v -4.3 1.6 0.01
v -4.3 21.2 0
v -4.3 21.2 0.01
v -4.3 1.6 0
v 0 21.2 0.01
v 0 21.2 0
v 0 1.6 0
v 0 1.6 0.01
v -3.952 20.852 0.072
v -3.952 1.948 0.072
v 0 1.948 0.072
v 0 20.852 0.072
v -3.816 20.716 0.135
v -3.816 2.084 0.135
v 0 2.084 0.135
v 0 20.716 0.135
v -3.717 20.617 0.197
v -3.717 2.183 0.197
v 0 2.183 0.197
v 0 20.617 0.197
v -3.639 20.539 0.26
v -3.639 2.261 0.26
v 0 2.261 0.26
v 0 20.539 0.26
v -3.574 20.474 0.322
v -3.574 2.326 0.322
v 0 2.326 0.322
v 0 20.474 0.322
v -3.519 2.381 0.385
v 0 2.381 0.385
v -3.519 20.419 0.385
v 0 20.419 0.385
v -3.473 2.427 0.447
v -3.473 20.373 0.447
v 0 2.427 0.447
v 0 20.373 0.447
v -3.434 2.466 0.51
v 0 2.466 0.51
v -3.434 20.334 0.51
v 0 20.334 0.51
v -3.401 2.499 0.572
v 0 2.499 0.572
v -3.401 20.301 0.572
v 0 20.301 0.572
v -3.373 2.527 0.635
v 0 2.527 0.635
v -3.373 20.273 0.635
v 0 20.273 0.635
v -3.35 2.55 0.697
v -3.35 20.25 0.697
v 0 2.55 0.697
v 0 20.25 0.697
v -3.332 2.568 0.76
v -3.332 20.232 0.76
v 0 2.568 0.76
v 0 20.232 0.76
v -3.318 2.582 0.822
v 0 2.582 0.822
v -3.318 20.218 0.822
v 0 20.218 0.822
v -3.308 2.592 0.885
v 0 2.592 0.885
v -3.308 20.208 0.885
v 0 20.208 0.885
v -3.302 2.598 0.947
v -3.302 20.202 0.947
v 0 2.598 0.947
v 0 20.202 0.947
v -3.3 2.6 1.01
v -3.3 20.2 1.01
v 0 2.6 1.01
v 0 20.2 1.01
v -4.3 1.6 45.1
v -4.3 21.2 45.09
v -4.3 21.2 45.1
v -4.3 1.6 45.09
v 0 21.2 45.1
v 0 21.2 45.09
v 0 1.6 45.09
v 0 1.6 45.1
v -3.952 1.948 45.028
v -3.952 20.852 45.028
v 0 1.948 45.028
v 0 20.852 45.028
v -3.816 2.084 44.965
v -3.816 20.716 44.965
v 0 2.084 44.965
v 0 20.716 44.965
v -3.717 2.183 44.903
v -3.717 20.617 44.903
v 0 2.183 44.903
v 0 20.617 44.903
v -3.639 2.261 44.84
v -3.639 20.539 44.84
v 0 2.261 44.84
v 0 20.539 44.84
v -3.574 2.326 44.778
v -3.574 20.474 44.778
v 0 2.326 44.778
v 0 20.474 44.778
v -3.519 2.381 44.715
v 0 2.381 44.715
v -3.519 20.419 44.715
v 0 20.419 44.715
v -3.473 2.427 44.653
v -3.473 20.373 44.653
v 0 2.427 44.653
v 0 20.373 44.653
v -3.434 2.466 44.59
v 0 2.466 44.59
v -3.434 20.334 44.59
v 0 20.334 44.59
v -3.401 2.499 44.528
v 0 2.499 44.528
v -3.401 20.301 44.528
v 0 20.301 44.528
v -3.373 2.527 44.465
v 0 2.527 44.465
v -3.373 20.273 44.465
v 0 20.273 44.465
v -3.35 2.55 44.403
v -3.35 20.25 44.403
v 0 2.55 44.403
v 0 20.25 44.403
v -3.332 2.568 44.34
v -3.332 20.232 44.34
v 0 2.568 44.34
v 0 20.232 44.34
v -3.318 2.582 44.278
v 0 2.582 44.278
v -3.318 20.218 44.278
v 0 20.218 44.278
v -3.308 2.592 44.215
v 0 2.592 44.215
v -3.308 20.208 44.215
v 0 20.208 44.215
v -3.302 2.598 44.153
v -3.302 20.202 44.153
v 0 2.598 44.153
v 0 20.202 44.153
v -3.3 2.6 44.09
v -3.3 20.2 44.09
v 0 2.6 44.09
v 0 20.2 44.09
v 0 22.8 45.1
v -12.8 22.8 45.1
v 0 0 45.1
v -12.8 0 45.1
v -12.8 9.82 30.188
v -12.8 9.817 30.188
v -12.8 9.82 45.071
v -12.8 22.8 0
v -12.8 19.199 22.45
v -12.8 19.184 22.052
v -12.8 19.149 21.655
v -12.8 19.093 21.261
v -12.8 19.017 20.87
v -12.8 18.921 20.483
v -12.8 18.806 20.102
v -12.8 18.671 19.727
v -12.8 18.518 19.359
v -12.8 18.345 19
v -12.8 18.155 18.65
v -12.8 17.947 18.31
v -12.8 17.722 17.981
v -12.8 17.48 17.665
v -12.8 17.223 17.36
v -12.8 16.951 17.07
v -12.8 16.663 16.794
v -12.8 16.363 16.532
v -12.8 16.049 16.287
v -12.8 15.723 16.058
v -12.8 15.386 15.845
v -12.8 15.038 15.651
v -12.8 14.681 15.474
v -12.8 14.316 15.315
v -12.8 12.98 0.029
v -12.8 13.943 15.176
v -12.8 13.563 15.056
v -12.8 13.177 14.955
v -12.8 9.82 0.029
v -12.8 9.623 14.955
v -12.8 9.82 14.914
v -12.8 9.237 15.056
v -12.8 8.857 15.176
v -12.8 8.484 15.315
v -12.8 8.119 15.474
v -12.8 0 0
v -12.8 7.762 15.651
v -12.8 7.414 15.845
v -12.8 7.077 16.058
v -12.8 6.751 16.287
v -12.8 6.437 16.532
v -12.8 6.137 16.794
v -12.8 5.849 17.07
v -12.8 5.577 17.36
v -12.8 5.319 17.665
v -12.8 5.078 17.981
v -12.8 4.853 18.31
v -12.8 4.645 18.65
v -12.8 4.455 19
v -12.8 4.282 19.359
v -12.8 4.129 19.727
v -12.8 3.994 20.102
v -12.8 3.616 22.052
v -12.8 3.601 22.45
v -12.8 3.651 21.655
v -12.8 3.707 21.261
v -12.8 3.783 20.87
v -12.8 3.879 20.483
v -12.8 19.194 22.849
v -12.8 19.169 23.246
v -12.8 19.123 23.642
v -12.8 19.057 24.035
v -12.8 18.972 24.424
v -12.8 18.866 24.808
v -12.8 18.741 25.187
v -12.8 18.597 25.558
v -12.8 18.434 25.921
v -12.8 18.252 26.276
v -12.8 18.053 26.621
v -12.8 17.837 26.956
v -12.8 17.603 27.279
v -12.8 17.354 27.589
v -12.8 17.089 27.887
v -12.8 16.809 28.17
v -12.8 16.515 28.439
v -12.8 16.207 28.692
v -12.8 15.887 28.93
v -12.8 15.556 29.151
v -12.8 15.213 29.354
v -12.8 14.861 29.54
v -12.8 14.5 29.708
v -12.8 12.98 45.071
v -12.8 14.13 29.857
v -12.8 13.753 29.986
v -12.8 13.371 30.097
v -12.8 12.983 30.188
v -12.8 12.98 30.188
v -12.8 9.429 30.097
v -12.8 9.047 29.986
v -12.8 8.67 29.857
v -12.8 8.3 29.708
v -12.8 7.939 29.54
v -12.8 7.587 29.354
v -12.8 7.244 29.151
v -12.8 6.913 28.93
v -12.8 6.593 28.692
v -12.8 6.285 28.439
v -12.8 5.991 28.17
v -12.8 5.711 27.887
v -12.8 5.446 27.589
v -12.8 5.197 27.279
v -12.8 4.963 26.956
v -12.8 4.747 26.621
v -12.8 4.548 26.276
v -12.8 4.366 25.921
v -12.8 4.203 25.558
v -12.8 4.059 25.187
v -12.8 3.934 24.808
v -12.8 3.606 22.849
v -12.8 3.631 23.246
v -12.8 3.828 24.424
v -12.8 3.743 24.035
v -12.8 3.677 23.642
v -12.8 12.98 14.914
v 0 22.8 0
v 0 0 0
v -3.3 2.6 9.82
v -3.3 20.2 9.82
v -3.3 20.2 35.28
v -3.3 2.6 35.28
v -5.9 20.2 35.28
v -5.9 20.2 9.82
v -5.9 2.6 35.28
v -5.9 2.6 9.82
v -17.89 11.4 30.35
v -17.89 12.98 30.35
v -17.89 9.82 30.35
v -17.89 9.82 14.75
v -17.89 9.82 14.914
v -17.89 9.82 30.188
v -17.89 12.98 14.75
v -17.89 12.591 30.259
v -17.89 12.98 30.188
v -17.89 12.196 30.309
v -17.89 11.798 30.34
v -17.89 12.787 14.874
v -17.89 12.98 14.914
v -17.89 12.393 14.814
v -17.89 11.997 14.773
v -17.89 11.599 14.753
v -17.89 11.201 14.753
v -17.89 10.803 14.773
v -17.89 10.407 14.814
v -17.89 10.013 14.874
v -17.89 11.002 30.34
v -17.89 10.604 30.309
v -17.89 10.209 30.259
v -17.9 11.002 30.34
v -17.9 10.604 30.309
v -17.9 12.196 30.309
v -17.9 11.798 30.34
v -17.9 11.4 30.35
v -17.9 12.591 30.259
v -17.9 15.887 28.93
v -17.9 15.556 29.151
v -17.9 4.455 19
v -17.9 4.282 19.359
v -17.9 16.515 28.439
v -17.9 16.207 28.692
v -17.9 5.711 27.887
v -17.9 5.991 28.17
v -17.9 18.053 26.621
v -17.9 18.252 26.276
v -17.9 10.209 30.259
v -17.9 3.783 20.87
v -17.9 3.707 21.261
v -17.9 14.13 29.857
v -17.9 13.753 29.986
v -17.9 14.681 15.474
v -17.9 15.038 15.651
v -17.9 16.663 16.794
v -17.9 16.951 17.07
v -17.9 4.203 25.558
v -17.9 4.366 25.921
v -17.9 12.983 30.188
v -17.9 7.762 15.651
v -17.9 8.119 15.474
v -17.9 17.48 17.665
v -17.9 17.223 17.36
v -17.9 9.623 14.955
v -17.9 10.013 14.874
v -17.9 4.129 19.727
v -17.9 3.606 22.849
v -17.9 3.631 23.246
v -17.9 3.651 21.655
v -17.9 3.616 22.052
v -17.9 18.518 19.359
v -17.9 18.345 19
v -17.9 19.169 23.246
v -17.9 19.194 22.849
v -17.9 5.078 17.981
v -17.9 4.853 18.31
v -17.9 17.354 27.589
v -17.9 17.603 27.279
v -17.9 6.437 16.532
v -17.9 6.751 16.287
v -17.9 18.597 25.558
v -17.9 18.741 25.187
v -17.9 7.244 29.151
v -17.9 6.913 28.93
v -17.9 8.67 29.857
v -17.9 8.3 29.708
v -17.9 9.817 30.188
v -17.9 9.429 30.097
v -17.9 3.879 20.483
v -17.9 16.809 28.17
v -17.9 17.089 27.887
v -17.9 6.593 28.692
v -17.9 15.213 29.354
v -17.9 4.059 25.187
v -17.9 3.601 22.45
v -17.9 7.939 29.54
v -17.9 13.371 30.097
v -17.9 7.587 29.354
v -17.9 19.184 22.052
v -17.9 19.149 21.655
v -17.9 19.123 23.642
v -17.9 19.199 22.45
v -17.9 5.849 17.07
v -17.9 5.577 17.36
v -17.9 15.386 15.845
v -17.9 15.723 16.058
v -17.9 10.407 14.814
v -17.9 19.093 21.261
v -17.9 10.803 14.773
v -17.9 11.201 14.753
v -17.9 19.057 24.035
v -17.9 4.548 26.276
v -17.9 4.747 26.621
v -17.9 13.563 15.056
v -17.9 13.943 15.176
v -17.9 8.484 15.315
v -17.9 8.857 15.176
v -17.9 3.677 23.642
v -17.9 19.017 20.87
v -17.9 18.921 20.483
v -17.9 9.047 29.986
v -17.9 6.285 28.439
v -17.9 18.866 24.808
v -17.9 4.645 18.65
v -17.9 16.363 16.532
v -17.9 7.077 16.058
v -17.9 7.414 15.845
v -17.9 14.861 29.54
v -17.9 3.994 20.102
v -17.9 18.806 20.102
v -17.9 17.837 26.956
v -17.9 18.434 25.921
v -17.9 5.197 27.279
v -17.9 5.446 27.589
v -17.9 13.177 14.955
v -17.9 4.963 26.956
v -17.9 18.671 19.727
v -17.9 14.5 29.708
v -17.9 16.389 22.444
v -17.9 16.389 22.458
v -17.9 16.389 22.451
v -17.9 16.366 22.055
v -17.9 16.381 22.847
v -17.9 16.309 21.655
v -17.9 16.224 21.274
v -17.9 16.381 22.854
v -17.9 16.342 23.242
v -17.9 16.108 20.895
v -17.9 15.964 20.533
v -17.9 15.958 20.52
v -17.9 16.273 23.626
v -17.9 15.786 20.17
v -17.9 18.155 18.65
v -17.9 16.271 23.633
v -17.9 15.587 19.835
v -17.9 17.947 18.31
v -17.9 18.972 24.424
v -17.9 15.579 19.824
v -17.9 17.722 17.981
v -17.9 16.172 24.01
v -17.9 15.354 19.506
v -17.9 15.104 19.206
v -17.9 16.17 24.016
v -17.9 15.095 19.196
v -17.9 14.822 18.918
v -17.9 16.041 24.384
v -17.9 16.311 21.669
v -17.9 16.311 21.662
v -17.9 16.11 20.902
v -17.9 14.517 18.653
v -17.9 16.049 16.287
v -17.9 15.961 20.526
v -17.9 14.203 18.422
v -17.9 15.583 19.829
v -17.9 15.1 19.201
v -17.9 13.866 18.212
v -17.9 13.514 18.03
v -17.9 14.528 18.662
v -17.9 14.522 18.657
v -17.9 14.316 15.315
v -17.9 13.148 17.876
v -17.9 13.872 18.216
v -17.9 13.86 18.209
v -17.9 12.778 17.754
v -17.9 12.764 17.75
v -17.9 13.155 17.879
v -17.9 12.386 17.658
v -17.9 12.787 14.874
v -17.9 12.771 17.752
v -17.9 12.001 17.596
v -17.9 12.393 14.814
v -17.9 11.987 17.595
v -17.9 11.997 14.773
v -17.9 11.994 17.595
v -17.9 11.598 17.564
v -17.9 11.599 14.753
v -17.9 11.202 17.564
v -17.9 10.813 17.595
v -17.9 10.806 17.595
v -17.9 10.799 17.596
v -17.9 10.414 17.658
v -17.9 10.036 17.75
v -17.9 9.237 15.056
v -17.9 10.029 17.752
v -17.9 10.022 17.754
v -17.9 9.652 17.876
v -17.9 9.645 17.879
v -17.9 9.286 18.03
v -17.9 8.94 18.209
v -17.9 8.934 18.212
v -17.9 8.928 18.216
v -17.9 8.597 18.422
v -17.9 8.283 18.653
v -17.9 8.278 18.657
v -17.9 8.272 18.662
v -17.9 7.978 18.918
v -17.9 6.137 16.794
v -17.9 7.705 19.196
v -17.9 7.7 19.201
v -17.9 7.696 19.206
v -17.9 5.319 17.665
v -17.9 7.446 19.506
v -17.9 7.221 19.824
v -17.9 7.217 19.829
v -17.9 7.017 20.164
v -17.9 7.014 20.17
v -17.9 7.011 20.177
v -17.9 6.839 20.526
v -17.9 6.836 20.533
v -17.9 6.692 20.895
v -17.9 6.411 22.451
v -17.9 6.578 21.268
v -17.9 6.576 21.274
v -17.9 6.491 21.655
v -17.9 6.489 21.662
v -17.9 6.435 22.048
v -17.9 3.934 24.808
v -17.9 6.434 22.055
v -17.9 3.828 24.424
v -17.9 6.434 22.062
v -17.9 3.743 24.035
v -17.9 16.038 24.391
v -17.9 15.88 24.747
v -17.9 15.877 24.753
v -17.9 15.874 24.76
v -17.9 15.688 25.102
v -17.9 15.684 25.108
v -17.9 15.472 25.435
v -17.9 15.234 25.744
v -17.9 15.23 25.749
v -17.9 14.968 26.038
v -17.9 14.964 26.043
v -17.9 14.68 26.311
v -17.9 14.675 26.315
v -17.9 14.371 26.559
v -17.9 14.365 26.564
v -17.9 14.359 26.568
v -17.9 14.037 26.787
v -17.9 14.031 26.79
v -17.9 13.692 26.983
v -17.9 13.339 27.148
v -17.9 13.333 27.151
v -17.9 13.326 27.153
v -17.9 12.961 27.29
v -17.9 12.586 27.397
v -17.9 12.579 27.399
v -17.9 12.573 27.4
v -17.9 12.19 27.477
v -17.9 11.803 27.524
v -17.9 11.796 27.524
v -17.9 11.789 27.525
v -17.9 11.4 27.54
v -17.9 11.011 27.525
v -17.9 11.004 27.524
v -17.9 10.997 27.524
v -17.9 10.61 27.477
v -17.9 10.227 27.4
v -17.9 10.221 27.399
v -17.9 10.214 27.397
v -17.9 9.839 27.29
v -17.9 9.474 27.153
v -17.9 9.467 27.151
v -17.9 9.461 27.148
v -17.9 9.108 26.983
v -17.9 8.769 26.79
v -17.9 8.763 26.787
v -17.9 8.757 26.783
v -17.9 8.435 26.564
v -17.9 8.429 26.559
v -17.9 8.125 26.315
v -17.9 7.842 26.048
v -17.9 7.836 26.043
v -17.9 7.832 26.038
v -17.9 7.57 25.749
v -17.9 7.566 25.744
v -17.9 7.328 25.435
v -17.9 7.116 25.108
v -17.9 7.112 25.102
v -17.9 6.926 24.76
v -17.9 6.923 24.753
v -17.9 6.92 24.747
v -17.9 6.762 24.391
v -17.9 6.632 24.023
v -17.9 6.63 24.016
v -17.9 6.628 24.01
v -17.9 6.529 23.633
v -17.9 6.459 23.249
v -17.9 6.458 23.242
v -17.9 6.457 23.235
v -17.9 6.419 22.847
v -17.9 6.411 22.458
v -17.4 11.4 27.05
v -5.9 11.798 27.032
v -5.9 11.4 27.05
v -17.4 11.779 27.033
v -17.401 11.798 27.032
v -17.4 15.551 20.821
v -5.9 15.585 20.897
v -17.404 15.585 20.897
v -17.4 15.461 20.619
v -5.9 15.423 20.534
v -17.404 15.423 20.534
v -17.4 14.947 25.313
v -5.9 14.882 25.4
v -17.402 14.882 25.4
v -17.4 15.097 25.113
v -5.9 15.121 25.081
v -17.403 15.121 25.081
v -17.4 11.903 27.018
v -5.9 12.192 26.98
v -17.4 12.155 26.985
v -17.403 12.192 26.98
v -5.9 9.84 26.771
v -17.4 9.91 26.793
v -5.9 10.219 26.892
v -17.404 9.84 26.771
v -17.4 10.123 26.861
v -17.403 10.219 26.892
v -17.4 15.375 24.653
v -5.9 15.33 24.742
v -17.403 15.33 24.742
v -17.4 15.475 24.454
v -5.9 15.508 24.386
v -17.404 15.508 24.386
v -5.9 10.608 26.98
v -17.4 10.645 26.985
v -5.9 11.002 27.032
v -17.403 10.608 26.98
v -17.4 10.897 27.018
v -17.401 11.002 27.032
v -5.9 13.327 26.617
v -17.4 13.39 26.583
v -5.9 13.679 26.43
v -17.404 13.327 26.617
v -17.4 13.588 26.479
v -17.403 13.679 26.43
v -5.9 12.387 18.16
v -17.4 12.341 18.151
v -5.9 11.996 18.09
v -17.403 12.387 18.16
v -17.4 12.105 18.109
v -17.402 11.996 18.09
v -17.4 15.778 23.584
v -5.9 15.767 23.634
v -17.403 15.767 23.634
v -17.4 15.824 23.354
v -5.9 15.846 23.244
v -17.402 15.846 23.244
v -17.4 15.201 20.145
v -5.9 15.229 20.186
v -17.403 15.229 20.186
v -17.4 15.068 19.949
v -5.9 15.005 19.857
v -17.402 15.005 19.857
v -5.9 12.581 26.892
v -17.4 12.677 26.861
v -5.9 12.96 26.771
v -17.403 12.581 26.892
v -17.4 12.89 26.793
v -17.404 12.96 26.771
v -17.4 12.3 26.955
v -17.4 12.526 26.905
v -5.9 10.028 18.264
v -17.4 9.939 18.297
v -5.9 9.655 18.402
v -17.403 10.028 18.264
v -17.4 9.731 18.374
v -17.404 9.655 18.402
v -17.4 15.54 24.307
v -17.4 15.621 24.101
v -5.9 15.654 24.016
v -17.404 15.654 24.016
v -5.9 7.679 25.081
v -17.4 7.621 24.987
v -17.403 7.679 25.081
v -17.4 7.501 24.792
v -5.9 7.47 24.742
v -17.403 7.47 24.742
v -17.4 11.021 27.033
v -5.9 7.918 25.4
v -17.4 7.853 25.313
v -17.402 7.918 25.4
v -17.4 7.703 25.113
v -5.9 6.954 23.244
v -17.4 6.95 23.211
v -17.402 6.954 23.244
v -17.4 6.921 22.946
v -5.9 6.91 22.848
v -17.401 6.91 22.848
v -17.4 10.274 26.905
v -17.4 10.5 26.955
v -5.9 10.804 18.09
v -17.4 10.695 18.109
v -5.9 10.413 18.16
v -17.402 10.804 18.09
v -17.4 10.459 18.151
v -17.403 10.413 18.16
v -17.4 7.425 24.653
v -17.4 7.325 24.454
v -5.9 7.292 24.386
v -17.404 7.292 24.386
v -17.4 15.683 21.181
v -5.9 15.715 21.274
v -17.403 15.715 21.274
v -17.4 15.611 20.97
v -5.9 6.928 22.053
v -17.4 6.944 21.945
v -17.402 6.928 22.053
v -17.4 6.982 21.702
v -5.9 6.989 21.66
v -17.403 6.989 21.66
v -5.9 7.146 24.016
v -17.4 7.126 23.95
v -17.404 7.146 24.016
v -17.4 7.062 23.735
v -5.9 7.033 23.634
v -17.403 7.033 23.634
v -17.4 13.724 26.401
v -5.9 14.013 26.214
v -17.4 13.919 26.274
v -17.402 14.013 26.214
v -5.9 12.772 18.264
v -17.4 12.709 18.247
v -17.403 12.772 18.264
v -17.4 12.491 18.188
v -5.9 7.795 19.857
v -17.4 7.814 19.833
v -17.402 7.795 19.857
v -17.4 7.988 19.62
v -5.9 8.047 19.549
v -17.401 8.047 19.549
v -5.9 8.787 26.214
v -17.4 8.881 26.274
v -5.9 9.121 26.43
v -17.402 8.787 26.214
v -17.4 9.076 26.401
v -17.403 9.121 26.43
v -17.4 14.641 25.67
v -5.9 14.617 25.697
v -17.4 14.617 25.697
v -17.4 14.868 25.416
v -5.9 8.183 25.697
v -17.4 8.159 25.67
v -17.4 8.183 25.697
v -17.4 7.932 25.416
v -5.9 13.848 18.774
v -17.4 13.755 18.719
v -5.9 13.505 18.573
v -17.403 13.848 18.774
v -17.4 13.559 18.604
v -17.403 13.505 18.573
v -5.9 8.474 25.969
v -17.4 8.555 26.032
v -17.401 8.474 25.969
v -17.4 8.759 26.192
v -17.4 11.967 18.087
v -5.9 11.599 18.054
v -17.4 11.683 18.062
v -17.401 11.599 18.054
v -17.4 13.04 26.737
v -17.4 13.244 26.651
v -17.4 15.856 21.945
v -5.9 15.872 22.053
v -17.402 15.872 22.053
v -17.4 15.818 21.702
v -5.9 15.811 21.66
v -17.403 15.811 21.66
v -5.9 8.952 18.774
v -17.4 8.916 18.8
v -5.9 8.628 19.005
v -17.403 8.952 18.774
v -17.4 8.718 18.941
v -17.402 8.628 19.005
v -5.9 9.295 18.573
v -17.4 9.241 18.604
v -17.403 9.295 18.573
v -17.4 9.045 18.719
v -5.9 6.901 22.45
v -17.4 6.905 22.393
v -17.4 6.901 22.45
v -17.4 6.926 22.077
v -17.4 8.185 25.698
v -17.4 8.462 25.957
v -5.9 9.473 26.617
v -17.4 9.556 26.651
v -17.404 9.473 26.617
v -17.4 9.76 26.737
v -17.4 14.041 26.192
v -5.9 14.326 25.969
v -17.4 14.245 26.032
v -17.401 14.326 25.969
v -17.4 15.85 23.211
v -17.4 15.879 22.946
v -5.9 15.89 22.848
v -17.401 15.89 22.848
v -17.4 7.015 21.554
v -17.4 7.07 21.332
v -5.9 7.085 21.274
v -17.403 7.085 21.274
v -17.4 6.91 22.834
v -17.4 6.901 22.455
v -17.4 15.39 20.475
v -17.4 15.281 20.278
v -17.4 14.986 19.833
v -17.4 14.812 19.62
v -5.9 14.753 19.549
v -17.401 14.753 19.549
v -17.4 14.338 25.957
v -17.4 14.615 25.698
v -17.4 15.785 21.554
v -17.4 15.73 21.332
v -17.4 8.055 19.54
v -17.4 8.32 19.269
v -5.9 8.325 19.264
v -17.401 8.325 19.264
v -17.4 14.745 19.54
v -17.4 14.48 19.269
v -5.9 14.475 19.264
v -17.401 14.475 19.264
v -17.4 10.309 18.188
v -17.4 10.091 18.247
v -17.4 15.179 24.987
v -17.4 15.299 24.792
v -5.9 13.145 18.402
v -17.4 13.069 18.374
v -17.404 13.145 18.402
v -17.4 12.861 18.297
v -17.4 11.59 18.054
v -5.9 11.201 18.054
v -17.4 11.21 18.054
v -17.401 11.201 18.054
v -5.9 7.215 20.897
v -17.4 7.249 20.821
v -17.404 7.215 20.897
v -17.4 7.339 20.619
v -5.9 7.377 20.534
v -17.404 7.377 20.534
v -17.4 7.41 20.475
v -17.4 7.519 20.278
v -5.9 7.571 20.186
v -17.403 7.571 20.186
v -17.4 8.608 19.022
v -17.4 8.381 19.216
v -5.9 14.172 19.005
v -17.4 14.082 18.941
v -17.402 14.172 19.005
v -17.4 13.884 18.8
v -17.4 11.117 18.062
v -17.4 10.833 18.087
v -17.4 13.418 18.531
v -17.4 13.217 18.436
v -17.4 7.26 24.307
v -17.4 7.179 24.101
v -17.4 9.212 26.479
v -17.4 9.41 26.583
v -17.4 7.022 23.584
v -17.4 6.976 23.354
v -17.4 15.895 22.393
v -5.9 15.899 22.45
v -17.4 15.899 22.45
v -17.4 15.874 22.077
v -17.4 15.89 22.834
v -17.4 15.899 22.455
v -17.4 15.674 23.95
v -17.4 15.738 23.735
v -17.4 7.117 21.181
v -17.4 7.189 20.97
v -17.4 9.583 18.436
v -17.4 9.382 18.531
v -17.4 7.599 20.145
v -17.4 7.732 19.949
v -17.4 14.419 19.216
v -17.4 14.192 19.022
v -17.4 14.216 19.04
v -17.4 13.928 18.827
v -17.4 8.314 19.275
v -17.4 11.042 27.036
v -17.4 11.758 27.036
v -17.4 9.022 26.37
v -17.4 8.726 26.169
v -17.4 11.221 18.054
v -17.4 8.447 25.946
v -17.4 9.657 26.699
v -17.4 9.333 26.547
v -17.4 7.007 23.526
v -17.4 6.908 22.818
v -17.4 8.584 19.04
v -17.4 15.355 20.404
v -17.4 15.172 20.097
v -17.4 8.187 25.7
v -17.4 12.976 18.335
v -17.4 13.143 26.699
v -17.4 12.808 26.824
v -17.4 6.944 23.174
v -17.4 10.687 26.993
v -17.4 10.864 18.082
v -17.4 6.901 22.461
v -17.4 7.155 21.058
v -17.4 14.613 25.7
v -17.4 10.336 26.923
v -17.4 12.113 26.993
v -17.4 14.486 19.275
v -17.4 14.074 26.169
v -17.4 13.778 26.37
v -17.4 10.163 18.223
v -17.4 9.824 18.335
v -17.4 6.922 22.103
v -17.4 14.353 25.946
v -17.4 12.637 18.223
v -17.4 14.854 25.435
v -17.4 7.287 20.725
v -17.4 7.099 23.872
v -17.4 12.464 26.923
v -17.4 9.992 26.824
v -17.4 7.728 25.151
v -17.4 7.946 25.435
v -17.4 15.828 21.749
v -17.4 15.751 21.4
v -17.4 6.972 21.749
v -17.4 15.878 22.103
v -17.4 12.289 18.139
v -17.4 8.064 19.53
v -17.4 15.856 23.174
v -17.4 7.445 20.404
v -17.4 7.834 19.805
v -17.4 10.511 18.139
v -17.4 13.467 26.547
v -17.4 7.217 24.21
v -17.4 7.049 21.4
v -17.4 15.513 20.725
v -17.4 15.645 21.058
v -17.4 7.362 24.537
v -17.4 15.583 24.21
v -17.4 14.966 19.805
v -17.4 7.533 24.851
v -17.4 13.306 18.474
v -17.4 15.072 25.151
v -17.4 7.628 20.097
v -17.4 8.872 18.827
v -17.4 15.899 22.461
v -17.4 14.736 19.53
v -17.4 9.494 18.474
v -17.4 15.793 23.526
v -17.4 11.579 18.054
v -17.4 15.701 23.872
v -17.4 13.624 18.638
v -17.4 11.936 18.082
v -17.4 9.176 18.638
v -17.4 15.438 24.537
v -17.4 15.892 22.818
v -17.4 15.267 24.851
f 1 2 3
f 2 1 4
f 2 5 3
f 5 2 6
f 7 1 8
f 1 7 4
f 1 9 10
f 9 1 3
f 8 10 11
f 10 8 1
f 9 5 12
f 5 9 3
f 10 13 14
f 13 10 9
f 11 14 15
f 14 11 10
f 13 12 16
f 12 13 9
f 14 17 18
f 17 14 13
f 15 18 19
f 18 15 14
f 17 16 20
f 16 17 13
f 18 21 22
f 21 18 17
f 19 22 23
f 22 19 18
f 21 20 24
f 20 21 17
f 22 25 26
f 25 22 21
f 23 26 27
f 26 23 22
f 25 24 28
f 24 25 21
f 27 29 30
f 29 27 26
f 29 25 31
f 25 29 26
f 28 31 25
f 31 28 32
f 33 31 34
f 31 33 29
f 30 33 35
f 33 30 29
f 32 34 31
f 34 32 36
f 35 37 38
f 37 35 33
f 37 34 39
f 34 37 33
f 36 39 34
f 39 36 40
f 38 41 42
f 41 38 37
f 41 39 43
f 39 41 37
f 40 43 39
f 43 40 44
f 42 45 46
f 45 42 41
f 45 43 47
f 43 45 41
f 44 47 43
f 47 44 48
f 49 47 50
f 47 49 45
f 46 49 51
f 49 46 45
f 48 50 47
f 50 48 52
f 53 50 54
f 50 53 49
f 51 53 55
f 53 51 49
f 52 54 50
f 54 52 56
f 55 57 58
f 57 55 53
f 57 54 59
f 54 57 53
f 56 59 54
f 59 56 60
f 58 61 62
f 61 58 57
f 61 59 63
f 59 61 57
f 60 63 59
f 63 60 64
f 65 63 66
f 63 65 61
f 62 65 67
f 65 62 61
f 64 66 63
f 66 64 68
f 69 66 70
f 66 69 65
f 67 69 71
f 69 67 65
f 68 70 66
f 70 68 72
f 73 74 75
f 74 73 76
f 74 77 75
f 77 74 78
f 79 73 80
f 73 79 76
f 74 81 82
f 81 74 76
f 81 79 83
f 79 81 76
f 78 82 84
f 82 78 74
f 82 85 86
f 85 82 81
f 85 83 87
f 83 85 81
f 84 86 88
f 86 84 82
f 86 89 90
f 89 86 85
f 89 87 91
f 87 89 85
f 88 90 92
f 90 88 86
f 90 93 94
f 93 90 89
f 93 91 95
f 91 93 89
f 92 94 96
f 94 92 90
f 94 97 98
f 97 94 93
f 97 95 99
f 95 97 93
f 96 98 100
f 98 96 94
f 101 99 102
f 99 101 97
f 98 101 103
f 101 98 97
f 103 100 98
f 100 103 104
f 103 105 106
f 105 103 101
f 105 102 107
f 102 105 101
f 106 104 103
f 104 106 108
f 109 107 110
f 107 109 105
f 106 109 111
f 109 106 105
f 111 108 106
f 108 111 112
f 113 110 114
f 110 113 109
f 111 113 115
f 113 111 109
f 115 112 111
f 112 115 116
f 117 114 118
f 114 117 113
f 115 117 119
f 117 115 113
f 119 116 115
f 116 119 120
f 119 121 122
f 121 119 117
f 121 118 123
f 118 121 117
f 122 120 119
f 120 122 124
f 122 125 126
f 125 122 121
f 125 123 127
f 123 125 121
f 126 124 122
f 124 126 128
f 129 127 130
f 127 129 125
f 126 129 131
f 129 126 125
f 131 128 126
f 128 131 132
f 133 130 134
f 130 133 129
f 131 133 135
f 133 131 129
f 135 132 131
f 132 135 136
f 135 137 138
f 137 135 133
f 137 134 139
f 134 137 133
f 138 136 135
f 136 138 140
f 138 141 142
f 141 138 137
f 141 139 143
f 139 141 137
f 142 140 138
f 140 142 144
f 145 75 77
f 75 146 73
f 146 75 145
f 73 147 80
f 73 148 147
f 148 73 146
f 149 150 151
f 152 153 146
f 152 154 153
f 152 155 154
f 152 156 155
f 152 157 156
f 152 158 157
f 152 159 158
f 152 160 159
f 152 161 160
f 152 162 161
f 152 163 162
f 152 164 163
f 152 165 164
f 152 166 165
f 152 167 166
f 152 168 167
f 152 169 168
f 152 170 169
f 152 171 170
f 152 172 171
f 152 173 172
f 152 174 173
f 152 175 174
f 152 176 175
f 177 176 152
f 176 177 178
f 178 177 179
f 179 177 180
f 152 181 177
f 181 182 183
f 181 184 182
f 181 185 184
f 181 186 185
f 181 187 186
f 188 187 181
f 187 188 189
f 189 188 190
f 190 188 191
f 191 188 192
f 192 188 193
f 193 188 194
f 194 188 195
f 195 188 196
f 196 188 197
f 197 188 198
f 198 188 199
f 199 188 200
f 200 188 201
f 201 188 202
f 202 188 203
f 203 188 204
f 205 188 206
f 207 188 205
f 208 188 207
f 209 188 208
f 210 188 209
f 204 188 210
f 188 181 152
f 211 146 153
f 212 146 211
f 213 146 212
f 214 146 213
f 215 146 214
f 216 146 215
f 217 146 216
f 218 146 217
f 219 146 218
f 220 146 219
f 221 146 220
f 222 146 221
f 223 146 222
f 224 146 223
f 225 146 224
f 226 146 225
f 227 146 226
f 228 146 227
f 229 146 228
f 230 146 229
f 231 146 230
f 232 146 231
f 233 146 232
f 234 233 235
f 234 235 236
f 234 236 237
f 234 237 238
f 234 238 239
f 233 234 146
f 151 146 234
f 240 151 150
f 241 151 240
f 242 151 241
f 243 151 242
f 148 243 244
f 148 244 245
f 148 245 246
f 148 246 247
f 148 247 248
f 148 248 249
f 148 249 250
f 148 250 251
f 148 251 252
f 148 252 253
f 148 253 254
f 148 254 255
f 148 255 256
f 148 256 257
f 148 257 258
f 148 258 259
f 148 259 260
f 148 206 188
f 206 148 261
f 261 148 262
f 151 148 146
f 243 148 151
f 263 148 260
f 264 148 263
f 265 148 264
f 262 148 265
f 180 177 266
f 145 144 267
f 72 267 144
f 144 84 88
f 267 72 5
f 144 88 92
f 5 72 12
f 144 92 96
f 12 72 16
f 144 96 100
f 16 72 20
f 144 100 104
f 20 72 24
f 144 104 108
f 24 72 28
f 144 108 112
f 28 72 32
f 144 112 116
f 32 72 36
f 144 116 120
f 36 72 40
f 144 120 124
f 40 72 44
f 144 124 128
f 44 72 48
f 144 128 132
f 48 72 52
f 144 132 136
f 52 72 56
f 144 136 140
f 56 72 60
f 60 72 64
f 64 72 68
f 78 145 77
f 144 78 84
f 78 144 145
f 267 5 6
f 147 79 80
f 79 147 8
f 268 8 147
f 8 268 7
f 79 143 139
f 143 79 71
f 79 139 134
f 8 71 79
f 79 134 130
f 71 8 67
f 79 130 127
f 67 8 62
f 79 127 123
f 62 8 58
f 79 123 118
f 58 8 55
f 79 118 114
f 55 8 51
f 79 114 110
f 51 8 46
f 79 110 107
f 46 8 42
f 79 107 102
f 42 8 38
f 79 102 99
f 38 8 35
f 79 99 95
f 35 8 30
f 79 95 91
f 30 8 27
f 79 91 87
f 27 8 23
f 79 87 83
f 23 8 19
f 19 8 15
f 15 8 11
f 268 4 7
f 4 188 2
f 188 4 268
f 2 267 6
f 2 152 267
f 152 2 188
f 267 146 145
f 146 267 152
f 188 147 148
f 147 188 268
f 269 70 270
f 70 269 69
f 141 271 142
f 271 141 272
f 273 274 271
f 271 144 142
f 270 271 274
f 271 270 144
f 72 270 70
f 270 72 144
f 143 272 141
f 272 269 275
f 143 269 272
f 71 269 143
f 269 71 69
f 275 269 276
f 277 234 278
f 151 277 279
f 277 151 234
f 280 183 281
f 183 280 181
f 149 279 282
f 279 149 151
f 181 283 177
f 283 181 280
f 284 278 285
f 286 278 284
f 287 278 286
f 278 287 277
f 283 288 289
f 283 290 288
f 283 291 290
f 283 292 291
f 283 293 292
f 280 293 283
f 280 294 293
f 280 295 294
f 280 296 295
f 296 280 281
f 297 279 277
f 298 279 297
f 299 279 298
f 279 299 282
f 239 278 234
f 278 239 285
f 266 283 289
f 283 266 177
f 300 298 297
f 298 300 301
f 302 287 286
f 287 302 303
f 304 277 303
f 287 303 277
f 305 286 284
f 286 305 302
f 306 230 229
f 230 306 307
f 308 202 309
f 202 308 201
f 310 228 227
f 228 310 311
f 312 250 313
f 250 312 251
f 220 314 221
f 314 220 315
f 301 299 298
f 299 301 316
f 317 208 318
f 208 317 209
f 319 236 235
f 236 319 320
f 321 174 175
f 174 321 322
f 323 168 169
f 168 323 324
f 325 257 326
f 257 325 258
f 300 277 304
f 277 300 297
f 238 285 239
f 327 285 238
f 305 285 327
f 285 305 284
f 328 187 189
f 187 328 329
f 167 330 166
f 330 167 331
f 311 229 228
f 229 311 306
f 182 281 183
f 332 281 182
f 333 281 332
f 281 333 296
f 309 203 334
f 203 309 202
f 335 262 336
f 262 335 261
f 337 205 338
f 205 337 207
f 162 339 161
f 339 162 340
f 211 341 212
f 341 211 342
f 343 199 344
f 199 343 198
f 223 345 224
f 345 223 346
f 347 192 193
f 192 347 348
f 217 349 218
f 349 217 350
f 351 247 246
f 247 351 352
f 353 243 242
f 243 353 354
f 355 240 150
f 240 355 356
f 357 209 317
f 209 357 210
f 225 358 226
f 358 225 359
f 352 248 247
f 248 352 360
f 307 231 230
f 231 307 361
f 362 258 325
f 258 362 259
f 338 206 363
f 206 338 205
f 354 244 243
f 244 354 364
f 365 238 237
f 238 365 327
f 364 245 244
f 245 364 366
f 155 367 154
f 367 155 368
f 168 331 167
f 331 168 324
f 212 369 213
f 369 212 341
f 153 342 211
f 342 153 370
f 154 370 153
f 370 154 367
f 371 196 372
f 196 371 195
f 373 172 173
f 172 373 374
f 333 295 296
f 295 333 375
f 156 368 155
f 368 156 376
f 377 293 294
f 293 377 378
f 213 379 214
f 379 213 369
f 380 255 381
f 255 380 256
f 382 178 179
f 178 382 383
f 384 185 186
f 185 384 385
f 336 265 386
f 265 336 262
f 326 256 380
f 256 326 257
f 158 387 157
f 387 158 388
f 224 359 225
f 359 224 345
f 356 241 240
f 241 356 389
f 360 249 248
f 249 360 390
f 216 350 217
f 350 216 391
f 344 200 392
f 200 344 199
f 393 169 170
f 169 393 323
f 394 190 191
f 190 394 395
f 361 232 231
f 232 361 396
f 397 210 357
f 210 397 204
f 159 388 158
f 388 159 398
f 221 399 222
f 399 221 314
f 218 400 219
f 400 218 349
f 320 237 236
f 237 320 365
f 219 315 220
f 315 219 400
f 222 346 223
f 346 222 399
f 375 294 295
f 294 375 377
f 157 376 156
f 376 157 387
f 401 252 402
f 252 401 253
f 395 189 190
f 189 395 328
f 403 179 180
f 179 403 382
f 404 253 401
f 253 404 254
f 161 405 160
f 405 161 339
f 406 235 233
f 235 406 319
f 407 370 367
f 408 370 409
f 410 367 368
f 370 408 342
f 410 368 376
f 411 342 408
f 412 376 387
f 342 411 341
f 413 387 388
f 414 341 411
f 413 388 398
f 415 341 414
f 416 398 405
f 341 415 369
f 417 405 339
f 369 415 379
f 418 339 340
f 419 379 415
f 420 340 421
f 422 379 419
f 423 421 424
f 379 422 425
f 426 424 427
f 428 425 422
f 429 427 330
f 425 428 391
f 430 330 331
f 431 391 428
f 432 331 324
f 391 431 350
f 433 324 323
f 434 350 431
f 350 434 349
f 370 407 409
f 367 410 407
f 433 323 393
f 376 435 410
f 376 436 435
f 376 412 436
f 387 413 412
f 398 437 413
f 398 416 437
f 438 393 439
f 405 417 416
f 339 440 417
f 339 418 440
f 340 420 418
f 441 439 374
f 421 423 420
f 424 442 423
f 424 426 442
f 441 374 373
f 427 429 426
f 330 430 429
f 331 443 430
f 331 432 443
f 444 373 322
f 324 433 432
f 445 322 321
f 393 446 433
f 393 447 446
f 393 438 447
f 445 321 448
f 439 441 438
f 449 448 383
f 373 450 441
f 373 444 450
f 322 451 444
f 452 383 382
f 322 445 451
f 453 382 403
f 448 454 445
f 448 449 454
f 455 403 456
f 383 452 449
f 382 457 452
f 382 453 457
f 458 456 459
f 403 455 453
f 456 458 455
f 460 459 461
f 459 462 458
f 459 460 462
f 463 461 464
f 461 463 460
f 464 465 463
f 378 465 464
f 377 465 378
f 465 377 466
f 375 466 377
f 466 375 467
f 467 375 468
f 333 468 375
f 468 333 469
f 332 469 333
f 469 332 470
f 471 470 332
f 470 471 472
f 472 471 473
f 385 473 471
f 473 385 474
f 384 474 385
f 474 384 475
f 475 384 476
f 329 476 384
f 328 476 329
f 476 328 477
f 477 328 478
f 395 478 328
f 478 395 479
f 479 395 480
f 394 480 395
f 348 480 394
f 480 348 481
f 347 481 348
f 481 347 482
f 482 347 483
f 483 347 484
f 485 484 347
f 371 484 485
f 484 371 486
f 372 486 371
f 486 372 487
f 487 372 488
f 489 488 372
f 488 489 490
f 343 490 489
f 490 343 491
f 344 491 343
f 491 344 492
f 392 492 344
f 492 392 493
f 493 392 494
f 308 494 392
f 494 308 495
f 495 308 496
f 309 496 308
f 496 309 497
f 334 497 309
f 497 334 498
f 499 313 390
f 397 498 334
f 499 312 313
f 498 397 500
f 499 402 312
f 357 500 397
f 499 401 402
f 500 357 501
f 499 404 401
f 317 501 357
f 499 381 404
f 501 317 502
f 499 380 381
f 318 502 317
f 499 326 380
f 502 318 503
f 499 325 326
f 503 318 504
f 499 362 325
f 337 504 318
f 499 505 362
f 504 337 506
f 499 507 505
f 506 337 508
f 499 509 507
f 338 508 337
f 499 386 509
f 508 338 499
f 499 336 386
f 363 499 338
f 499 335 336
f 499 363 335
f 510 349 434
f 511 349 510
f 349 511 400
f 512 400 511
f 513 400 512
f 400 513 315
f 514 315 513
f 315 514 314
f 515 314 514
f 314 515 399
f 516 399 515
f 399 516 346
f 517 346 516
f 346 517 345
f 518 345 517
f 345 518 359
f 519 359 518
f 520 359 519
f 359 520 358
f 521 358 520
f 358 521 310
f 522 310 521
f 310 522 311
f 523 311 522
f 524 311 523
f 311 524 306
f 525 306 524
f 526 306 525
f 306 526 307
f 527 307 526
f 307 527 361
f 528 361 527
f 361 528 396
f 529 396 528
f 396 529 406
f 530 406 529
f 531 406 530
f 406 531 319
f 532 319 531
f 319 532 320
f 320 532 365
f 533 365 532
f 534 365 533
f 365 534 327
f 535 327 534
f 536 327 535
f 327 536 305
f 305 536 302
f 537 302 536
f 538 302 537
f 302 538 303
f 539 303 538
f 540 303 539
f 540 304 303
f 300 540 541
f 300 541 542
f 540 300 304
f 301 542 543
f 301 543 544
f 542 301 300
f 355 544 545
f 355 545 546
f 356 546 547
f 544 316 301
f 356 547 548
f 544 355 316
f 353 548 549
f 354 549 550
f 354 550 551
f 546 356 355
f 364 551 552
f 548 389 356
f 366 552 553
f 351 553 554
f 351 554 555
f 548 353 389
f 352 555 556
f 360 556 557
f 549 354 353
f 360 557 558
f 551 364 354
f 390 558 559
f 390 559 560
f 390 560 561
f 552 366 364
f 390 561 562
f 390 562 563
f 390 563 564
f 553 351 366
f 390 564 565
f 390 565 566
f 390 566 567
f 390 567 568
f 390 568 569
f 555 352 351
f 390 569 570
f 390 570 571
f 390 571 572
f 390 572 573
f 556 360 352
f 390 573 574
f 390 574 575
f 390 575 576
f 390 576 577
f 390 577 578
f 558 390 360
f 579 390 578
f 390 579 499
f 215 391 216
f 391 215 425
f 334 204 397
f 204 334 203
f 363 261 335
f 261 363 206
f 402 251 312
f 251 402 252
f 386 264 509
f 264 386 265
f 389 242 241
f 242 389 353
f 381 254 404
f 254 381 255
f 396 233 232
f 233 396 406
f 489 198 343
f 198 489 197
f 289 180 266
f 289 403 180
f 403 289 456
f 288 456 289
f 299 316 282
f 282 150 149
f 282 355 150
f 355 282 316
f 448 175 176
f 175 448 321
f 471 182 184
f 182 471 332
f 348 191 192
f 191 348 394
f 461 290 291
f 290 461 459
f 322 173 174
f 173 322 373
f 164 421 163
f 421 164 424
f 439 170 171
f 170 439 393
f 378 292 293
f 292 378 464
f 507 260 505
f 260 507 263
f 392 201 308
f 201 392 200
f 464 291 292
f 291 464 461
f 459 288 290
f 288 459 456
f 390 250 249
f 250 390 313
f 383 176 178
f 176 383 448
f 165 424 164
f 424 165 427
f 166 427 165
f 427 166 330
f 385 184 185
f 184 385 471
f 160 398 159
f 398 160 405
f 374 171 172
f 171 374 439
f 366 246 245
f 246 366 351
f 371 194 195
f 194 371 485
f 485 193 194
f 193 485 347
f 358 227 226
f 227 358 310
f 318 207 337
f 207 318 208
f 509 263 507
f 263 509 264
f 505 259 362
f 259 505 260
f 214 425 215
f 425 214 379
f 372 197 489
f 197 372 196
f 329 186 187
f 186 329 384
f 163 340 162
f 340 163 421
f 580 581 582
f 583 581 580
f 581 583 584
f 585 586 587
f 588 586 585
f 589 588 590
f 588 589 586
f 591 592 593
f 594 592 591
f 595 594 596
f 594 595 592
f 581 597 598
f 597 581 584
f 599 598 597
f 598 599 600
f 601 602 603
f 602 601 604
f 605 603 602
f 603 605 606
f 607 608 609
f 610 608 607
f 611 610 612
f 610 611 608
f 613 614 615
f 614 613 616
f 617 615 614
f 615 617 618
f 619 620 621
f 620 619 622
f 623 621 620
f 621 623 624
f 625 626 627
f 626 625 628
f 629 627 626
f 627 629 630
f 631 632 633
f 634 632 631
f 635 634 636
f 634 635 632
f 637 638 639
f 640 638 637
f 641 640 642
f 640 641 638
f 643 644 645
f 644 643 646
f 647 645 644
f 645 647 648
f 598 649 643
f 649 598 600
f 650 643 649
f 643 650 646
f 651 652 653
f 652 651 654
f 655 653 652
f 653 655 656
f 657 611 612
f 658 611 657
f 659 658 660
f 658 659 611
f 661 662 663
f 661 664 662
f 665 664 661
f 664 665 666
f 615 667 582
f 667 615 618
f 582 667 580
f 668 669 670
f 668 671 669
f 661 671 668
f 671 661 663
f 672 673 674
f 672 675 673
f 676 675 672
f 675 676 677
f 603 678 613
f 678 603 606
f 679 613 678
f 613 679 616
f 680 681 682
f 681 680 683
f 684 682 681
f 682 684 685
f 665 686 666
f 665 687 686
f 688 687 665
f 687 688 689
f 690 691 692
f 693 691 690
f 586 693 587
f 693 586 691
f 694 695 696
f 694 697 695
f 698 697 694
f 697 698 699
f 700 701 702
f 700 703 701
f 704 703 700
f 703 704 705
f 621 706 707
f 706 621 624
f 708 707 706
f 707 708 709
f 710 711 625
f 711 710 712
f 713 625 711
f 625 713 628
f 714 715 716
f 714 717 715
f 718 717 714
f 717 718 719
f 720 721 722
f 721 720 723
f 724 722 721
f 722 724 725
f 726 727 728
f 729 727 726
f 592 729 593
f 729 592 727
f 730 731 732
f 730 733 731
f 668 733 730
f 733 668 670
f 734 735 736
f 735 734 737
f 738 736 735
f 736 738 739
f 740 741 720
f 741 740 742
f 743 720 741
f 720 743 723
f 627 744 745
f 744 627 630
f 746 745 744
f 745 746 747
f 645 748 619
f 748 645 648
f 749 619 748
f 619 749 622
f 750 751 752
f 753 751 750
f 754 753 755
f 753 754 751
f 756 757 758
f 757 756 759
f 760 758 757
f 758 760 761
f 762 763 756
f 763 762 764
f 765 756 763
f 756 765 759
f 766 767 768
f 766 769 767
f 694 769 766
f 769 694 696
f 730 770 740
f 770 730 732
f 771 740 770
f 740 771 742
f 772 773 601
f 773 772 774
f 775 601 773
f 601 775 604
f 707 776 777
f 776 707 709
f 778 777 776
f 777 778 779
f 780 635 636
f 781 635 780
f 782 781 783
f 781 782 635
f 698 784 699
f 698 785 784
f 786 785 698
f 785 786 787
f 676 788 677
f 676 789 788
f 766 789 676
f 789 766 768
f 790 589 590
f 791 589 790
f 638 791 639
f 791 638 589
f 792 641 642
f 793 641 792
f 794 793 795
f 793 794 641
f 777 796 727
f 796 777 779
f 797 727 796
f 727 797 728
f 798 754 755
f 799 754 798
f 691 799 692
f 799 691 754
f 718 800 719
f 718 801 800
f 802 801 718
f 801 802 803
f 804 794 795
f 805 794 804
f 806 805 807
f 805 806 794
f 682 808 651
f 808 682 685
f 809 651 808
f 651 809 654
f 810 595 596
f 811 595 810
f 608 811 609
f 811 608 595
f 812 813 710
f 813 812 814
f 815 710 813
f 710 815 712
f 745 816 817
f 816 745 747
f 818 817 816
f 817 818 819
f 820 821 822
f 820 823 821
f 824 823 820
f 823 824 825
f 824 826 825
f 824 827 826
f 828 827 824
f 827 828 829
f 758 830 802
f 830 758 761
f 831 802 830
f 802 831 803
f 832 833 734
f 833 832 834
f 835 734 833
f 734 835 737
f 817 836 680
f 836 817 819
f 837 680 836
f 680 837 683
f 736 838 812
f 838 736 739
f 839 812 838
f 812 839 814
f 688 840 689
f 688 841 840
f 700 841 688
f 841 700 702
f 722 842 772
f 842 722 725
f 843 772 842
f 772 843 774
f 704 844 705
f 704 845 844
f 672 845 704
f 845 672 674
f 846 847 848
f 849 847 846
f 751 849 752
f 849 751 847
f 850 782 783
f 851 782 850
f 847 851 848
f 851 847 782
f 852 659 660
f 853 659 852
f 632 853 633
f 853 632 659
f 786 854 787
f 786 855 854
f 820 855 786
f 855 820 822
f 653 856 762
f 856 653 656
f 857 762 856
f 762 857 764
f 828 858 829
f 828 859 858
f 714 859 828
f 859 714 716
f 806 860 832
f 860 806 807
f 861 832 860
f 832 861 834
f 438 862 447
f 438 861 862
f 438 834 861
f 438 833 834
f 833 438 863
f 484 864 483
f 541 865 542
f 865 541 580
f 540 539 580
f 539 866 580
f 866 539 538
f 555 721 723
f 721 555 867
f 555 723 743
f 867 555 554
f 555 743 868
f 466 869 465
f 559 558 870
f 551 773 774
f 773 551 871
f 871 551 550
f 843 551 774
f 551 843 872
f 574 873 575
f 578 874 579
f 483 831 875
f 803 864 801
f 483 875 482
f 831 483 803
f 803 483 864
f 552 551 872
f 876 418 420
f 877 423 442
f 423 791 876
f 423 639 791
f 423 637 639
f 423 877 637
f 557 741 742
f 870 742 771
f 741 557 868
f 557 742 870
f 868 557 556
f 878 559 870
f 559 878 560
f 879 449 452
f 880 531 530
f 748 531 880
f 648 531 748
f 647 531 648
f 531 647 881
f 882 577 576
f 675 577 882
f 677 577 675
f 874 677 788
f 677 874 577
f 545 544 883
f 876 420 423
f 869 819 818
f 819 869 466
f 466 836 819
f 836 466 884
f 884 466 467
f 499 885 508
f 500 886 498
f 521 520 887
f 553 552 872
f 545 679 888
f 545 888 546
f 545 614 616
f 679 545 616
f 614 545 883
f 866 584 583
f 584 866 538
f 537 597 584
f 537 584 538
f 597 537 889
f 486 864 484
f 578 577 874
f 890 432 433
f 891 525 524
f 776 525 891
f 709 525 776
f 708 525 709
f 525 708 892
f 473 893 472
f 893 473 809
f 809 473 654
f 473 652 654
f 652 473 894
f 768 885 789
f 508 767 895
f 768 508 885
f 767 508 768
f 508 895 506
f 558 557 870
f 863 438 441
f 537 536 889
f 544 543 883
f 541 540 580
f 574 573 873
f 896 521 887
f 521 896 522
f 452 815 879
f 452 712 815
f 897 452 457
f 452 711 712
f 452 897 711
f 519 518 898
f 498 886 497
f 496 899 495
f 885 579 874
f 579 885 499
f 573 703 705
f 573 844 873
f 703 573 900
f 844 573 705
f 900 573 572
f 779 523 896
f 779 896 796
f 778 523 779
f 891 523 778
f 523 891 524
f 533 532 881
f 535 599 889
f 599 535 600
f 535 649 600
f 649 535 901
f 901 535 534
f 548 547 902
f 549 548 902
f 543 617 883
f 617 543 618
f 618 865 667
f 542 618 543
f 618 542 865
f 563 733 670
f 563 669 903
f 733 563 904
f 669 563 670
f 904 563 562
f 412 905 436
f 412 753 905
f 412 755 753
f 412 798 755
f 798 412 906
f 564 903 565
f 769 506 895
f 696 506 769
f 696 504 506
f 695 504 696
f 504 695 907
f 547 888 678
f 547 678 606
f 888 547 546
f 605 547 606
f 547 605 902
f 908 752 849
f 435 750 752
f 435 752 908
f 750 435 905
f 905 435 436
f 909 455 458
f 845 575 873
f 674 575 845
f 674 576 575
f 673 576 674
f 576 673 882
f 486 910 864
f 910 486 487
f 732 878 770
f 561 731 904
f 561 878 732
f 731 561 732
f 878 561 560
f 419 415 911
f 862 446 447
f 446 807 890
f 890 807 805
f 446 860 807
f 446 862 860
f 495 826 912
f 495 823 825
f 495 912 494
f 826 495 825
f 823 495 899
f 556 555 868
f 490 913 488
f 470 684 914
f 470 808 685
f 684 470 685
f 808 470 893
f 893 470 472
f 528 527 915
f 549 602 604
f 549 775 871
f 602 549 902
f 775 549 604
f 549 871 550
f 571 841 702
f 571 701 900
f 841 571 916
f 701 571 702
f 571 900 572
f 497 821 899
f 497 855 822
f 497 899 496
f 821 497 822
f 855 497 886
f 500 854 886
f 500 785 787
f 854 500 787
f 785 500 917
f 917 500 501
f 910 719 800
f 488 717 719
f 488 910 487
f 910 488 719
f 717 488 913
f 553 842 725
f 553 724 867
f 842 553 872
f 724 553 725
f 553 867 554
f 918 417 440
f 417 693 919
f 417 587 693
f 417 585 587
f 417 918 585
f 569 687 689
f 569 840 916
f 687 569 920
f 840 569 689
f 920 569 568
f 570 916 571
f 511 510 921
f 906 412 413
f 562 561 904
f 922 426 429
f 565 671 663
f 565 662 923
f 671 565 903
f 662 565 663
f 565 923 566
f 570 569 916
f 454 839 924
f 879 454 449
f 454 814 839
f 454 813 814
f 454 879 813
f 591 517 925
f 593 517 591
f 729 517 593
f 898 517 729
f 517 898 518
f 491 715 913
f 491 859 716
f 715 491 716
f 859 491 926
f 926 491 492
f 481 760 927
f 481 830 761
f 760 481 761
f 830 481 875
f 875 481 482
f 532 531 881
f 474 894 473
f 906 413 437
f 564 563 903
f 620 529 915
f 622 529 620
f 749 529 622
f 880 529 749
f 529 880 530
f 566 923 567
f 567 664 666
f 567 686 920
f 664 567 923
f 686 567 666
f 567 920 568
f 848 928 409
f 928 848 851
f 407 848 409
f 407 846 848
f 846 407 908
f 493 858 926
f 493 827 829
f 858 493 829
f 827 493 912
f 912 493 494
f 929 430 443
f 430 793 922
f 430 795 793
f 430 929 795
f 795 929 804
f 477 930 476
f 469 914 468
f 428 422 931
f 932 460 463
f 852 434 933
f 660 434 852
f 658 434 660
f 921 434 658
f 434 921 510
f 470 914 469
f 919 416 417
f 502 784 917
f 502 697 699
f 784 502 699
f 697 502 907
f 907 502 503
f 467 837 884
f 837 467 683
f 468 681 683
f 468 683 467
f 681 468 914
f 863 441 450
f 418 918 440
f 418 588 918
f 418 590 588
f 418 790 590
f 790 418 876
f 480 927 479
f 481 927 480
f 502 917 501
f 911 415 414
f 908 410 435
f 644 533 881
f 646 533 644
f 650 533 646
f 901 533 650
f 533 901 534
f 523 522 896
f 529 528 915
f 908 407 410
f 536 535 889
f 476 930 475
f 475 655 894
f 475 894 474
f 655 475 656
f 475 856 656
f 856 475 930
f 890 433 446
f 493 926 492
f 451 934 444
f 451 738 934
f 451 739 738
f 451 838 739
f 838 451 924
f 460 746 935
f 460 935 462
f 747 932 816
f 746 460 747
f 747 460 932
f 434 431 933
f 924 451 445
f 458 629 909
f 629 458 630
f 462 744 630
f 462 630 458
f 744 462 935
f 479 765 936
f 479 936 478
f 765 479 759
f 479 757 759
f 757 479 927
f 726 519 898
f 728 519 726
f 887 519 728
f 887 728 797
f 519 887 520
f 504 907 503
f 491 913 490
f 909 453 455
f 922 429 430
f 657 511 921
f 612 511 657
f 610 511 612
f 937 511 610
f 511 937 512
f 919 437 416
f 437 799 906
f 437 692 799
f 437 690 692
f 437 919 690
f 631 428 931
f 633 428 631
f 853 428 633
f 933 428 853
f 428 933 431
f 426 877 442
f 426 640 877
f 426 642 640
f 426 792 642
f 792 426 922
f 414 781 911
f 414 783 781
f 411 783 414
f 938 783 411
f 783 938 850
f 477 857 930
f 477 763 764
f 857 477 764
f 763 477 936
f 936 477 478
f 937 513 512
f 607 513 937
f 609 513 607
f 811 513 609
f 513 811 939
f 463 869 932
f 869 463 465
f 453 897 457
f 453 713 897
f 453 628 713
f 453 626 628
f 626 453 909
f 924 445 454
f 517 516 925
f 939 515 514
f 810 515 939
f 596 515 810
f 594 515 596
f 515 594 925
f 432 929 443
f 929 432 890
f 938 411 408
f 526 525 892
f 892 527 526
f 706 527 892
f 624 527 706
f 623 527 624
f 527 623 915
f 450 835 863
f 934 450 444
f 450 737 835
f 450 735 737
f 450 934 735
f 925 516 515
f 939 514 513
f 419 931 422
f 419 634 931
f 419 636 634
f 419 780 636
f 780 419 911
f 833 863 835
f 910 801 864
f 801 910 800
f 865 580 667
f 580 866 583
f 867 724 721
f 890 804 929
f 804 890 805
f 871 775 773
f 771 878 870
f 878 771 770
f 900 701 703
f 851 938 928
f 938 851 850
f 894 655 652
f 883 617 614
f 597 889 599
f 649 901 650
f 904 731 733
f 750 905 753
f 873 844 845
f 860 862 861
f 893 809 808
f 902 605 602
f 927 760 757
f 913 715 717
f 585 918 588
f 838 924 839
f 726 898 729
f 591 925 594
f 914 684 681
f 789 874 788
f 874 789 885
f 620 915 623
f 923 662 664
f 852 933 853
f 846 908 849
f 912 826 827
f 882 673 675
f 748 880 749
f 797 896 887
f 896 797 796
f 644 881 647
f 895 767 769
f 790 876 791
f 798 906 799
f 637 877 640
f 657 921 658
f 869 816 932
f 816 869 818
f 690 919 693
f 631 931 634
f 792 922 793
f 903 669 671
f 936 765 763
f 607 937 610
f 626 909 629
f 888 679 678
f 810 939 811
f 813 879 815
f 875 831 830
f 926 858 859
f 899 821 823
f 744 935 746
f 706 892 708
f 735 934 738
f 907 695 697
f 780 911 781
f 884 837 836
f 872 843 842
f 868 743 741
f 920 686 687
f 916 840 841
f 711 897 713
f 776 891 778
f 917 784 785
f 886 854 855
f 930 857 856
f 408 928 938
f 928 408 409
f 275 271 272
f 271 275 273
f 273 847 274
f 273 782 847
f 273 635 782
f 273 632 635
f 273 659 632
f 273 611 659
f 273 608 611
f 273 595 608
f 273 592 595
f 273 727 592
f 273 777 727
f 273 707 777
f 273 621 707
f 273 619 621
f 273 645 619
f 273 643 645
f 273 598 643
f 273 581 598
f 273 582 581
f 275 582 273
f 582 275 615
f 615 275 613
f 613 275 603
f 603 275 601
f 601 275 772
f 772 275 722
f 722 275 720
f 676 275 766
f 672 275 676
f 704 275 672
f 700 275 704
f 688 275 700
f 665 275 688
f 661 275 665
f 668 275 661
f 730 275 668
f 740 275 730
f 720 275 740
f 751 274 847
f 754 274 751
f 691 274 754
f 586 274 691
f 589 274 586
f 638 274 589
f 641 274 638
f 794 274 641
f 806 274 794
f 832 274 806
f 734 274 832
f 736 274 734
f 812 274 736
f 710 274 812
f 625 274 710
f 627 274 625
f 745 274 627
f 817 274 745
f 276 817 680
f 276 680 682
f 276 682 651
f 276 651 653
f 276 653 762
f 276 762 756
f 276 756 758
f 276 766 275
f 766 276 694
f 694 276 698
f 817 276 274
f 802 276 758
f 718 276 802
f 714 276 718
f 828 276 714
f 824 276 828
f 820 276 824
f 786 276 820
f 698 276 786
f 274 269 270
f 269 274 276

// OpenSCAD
// Elevator door slider/hinge replacement part.
//
// Print in PETG or stronger material.
// It is a sliding fitting under sustained load.
print_on_end = true;

// Preview only
debug_relief = false;


// ---- PARAMETERS (mm) ----
$fa = 2;
$fs = 0.4;

eps = 0.01;

// ---- MEASURED (mm) ----
block_length   = 45.1;
block_width    = 22.8;   // measured 22.76, rounded
block_height   = 12.8;

leg_thickness  = 2.6;    // each side
web_at_land    = 9.5;    // channel ceiling to top face, at the bearing lands
boss_outer_d   = 15.6;
insert_outer_d = 10.0;   // measured off the heat-set insert in hand, at the serrated end.
insert_nose_d  = 9.0;    // same insert, plain end. It is tapered, so it has two.
insert_length  = 12.0;
rib_width      = 3.16;
relief_length  = 25.46;
relief_depth   = 2.6;    // how much deeper the middle pocket sits
screw_length   = 12;     // M8 x 1, fine pitch (coarse M8 would be 1.25)

channel_clearance = 0;
channel_lead_in   = 1;   // Radius of the rounded lead-in at each end of the channel
lead_in_steps     = 16;  // Slices the rounded lead-in is swept from. More is smoother
insert_chamfer    = 0.5;

// ---- CALCULATED (mm) ----
channel_width         = block_width - 2 * leg_thickness;
channel_depth_at_land = block_height - web_at_land;
web_at_relief         = web_at_land - relief_depth;
channel_depth_relief  = channel_depth_at_land + relief_depth;
fitted_channel_width  = channel_width + channel_clearance;
relief_pocket_depth   = channel_depth_relief;
insert_bore_d         = insert_nose_d;

function block_width_for(chan_w) = chan_w + (leg_thickness * 2);

fitted_block_width = block_width_for(fitted_channel_width);

boss_x = block_length / 2;
boss_y = fitted_block_width / 2;
boss_r = boss_outer_d / 2;

boss_height = screw_length - web_at_relief;
boss_top = block_height + boss_height;
bore_length = boss_top - relief_pocket_depth;


module channel(length, chan_w) {
    translate([-eps, leg_thickness, -eps])
        cube([length + (eps * 2), chan_w, channel_depth_at_land + eps]);
}


module lead_in_slice(chan_w, x) {
    u = min(channel_lead_in, channel_lead_in - x);
    f = channel_lead_in - sqrt(pow(channel_lead_in, 2) - pow(u, 2));

    translate([x, leg_thickness - f, -eps])
        cube([eps, chan_w + (f * 2), channel_depth_at_land + f + eps]);
}

module lead_in(chan_w) {
    step = channel_lead_in / lead_in_steps;

    for (i = [0 : lead_in_steps - 1])
        hull() {
            lead_in_slice(chan_w, i * step);
            lead_in_slice(chan_w, (i + 1) * step);
        }

    // A hair proud of the end face, so the cut definitely breaks through.
    hull() {
        lead_in_slice(chan_w, -eps);
        lead_in_slice(chan_w, 0);
    }
}


module lead_ins(length, chan_w) {
    lead_in(chan_w);

    translate([length, 0, 0])
        mirror([1, 0, 0])
            lead_in(chan_w);
}


// Block with the channel and both lead-ins taken out.
module shoe_body(length, chan_w = fitted_channel_width) {
    difference() {
        cube([length, block_width_for(chan_w), block_height]);

        channel(length, chan_w);
        lead_ins(length, chan_w);
    }
}


// Centred along the length, full channel width. NOT wider than the channel: the
// bump rides on the track and the track fits the channel, so the bump cannot be
// wider than the channel -- widening past that would only undercut the legs.
module relief_pocket(length, pocket_length, pocket_depth, chan_w = fitted_channel_width) {
    translate([(length - pocket_length) / 2, leg_thickness, -eps])
        cube([pocket_length, chan_w, pocket_depth + eps]);
}


module block() {
    shoe_body(block_length);
}


// A gusset supporting the boss
module rib() {
    translate([0, (fitted_block_width + rib_width) / 2, block_height - eps])
        rotate([90, 0, 0])
            linear_extrude(height = rib_width)
                polygon([[0, 0],
                         [block_length, 0],
                         [boss_x + boss_r, boss_height],
                         [boss_x - boss_r, boss_height]]);
}


module boss() {
    translate([boss_x, boss_y, block_height - eps])
        cylinder(d = boss_outer_d, h = boss_height + eps);
}


// Cosmetic-ish
// It is what lets the head finish flush when there is no spare depth to sink into.
module bore() {
    translate([boss_x, boss_y, -eps])
        cylinder(d = insert_bore_d, h = boss_top + (eps * 2));

    translate([boss_x, boss_y, boss_top - insert_chamfer])
        cylinder(d1 = insert_bore_d,
                 d2 = insert_bore_d + (insert_chamfer * 2),
                 h = insert_chamfer + eps);
}


module pocket() {
    relief_pocket(block_length, relief_length, relief_pocket_depth);
}


module slider() {
    difference() {
        union() {
            block();
            rib();
            boss();
        }

        pocket();
        bore();
    }
}


// ---- CHECKS ----
echo(str("channel       ", channel_width, " + ", channel_clearance, " = ", fitted_channel_width, " wide"));
echo(str("outer width   ", block_width, " -> ", fitted_block_width, ", legs stay ", leg_thickness));
echo(str("pocket        ", relief_length, " long x ", relief_pocket_depth, " deep"));
echo(str("web at relief ", block_height - relief_pocket_depth));
echo(str("bore          ", bore_length, " long, screw is ", screw_length));

// The insert is full depth, so anything that shortens the bore leaves insert or
// screw protruding into the pocket, where the bump is.
assert(bore_length >= insert_length - eps,
       "bore is shorter than the insert -- the insert will protrude into the relief pocket");
assert(bore_length >= screw_length - eps,
       "bore is shorter than the screw -- the screw will protrude into the relief pocket");

module assembly() {
    slider();

    if (debug_relief)
        color("mediumorchid", 0.6)
            pocket();
}

rotate(print_on_end ? [0, -90, 0] : [0, 0, 0])
    assembly();
